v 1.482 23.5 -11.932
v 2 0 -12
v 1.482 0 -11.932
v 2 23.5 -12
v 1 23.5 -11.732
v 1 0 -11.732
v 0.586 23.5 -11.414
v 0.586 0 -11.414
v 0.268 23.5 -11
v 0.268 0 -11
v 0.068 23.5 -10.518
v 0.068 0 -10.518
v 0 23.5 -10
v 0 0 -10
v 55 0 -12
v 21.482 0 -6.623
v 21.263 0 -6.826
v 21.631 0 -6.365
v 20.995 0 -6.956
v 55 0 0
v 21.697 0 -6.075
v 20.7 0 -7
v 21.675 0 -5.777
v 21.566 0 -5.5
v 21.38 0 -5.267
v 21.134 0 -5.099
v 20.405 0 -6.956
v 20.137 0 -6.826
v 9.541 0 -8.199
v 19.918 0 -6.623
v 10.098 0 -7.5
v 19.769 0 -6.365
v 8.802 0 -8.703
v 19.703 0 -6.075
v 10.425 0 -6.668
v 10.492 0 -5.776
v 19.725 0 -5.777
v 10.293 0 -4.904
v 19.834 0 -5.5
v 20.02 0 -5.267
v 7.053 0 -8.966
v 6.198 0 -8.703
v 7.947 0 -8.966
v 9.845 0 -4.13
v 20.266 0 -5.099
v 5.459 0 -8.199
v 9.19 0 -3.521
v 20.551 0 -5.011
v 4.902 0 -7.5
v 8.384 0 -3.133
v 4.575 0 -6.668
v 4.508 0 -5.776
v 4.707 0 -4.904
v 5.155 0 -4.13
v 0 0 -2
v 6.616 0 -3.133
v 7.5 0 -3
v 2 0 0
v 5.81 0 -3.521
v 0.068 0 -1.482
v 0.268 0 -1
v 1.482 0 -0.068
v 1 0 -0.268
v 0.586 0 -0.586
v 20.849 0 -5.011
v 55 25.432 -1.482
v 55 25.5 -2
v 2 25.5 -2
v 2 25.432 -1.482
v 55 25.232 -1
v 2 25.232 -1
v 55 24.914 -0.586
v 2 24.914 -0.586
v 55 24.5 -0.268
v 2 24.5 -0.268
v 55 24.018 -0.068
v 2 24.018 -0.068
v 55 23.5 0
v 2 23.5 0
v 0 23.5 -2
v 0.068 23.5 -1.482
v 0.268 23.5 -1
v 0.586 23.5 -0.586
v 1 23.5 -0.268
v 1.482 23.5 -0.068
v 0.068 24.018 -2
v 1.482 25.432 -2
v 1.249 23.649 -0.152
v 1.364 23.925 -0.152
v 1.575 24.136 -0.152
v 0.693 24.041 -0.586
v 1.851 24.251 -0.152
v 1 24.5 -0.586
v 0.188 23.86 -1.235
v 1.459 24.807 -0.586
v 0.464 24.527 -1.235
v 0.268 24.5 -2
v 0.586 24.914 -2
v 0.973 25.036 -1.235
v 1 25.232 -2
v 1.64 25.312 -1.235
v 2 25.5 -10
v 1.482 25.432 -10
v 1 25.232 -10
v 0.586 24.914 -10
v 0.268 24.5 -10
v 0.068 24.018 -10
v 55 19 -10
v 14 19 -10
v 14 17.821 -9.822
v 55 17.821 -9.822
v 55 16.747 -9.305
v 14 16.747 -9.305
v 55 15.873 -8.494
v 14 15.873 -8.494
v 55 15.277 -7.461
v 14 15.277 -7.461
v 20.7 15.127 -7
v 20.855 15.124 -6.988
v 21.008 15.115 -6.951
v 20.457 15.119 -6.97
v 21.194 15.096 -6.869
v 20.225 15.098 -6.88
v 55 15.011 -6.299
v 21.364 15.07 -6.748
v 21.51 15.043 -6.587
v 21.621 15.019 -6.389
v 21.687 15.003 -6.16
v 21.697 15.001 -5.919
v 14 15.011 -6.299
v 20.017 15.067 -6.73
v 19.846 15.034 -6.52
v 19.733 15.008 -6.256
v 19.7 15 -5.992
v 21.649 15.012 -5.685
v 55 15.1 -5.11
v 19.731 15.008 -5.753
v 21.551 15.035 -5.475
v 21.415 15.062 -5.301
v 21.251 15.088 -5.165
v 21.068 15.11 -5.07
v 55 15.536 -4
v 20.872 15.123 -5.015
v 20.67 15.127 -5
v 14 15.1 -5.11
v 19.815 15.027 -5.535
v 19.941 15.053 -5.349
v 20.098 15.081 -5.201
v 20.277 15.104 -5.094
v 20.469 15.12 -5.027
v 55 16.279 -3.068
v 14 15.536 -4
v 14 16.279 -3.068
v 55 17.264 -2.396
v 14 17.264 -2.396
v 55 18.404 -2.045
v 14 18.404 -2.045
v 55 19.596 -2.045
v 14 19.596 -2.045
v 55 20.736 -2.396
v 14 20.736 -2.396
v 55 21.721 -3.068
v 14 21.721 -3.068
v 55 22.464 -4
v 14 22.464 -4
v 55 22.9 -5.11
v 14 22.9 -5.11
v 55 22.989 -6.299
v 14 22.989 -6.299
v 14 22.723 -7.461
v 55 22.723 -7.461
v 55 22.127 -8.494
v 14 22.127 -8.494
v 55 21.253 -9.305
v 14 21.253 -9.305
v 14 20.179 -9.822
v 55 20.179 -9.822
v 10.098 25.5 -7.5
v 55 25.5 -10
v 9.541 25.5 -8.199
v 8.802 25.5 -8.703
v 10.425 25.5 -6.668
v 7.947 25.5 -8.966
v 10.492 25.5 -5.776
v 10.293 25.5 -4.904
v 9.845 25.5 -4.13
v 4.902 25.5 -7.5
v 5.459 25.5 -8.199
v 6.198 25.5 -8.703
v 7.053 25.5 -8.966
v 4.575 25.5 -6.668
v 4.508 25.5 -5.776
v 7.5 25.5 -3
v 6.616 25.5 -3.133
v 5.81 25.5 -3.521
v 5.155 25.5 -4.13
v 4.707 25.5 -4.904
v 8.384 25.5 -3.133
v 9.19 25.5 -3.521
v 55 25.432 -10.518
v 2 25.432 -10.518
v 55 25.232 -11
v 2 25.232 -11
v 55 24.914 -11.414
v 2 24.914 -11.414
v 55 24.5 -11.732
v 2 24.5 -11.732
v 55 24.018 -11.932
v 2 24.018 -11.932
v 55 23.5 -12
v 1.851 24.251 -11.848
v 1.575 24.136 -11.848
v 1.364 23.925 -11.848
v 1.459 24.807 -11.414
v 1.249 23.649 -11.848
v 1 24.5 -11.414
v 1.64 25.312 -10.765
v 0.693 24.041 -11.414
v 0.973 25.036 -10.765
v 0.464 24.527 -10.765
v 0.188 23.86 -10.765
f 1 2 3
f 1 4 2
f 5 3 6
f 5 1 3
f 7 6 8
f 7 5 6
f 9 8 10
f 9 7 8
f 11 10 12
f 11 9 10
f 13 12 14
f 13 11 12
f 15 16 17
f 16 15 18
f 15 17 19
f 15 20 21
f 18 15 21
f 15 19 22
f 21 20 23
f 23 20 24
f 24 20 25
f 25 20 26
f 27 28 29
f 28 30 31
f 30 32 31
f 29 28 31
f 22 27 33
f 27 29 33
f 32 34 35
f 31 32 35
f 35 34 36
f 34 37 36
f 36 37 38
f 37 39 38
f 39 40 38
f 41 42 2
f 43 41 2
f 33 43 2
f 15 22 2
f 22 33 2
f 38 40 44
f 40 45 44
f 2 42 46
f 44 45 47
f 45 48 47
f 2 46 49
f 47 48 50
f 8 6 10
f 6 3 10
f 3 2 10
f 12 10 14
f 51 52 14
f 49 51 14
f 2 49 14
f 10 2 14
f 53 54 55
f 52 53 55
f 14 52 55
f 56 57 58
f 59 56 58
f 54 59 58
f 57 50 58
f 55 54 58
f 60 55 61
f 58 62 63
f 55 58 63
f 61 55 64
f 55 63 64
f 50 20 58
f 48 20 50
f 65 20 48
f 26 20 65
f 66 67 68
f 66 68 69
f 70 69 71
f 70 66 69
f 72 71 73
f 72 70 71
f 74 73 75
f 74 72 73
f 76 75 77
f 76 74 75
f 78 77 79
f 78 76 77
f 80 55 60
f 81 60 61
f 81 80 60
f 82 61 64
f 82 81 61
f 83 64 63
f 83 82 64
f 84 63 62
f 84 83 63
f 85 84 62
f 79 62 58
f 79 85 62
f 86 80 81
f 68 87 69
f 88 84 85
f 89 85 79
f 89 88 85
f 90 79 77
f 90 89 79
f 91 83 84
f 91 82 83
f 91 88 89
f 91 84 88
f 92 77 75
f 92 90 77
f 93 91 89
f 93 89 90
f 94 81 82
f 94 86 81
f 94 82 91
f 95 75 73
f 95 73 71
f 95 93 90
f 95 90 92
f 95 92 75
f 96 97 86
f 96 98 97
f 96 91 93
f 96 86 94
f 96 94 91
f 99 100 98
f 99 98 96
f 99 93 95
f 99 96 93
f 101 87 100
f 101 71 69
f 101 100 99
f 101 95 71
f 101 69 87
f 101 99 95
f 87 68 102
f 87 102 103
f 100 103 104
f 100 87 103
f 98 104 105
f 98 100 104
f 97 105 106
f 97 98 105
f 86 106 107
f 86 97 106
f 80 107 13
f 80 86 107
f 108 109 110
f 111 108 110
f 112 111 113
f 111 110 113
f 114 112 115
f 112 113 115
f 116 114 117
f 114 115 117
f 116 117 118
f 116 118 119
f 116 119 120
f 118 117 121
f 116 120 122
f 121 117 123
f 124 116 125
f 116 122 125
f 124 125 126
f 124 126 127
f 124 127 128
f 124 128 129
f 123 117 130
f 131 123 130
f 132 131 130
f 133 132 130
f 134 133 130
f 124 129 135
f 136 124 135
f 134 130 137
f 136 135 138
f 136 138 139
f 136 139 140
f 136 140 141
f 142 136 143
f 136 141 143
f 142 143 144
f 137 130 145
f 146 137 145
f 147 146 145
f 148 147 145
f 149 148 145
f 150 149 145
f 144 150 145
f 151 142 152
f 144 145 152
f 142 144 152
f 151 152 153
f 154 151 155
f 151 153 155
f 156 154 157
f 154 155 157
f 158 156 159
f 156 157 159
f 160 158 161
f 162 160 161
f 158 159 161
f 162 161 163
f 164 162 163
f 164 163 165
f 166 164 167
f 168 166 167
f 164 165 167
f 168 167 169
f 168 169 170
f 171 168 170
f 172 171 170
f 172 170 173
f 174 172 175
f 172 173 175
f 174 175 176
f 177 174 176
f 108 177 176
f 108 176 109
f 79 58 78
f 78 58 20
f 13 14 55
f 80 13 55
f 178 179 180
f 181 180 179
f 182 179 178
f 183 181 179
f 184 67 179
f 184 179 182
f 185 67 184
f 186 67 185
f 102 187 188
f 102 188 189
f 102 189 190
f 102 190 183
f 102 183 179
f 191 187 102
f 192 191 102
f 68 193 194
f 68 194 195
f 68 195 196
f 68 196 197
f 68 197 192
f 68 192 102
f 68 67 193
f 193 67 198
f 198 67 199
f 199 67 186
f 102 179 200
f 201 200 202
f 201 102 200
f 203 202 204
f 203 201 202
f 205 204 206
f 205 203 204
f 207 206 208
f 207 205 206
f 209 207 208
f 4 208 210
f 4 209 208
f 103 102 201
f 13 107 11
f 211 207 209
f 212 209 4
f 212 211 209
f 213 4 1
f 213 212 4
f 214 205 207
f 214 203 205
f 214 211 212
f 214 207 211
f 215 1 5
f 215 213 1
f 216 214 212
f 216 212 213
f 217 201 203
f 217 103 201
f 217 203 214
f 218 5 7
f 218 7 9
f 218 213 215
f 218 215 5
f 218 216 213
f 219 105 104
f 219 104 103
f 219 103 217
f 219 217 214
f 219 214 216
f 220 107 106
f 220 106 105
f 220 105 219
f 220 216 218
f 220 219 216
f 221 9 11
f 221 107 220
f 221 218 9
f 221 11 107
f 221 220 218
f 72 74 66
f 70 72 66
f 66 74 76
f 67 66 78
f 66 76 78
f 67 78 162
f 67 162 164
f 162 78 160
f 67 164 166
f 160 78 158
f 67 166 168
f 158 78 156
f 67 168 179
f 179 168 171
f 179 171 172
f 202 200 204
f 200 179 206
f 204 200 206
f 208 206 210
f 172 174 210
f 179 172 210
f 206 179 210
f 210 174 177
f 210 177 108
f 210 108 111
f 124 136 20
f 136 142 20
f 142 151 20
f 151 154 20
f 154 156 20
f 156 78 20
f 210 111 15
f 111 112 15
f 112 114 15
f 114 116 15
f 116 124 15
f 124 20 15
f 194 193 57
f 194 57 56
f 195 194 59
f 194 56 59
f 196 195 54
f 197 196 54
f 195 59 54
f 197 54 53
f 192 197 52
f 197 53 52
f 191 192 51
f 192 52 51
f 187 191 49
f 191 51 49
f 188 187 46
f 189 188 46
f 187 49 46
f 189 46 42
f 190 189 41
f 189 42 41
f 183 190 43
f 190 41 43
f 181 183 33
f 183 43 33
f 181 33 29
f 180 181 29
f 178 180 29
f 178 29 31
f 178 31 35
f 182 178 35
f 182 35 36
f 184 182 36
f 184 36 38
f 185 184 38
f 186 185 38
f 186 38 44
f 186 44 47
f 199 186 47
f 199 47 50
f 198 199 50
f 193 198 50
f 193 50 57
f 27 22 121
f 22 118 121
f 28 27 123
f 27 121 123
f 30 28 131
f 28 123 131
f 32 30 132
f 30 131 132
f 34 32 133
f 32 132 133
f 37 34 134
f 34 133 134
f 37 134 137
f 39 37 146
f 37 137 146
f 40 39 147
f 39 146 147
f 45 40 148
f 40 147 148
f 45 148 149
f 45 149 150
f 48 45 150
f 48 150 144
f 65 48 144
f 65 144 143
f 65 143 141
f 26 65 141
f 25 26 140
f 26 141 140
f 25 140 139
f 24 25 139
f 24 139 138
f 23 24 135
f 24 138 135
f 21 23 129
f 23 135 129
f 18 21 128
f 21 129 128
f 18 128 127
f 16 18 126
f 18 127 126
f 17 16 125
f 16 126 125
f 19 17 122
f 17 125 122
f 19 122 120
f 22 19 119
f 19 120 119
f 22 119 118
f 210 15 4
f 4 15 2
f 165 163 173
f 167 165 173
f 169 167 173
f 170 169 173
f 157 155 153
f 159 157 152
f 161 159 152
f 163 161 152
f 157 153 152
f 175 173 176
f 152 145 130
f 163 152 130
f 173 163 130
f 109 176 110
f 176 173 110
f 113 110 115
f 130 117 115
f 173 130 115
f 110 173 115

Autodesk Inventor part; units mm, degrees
ref_plane "YZ Plane" through (0, 0, 0) normal (1, 0, 0) x (0, 1, 0)
ref_plane "XZ Plane" through (0, 0, 0) normal (0, 1, 0) x (-1, 0, 0)
ref_plane "XY Plane" through (0, 0, 0) normal (0, 0, 1) x (1, 0, 0)
sketch "Esboço2" plane through (0, 0, 0) normal (0, 1, 0) x (-1, 0, 0)
  line L0 (0, 0) -> (-55, 0)
  line L1 (-55, 0) -> (-55, -12)
  line L2 (-55, -12) -> (0, -12)
  line L3 (0, -12) -> (0, 0)
  dimension "d0" = 55
  dimension "d1" = 12
extrude "Extrusão1" add sketch "Esboço2" along normal blind 25.5
sketch "Esboço3" plane through (0, 25.5, 0) normal (0, 1, 0) x (1, 0, 0)
  line L0 (0, 12) -> (0, 0) projected
  line L1 (0, 6) -> (7.5, 6)
  dimension "d4" = 7.5
hole "Furo1" at (7.5, 25.5, -6) direction (0, -1, 0) diameter 6 end through all
sketch "Esboço4" plane through (0, 0, 0) normal (0, -1, 0) x (1, 0, 0)
  circle A0 centre (7.5, -6) radius 3 projected
  line L0 (7.5, -6) -> (20.7, -6)
  point P0 (0, 0)
  dimension "d12" = 13.2
sketch "Esboço5" plane through (55, 0, 0) normal (1, 0, 0) x (0, 0, -1)
  line L0 (0, 0) -> (0, 19)
  line L1 (0, 0) -> (0, 25.5) projected
  line L2 (0, 19) -> (6, 19)
  dimension "d13" = 19
  dimension "d14" = 6
hole "Furo2" at (55, 19, -6) direction (-1, 0, 0) diameter 8 depth 41
hole "Furo3" at (20.7, 0, -6) direction (0, 1, 0) diameter 2 depth 16
fillet "Arredondamento1" radius 2 5 edges at (0, 25.5, -6) (0, 12.75, 0) (0, 12.75, -12) (27.5, 25.5, 0) (27.5, 25.5, -12)
properties part number "cilinder"
